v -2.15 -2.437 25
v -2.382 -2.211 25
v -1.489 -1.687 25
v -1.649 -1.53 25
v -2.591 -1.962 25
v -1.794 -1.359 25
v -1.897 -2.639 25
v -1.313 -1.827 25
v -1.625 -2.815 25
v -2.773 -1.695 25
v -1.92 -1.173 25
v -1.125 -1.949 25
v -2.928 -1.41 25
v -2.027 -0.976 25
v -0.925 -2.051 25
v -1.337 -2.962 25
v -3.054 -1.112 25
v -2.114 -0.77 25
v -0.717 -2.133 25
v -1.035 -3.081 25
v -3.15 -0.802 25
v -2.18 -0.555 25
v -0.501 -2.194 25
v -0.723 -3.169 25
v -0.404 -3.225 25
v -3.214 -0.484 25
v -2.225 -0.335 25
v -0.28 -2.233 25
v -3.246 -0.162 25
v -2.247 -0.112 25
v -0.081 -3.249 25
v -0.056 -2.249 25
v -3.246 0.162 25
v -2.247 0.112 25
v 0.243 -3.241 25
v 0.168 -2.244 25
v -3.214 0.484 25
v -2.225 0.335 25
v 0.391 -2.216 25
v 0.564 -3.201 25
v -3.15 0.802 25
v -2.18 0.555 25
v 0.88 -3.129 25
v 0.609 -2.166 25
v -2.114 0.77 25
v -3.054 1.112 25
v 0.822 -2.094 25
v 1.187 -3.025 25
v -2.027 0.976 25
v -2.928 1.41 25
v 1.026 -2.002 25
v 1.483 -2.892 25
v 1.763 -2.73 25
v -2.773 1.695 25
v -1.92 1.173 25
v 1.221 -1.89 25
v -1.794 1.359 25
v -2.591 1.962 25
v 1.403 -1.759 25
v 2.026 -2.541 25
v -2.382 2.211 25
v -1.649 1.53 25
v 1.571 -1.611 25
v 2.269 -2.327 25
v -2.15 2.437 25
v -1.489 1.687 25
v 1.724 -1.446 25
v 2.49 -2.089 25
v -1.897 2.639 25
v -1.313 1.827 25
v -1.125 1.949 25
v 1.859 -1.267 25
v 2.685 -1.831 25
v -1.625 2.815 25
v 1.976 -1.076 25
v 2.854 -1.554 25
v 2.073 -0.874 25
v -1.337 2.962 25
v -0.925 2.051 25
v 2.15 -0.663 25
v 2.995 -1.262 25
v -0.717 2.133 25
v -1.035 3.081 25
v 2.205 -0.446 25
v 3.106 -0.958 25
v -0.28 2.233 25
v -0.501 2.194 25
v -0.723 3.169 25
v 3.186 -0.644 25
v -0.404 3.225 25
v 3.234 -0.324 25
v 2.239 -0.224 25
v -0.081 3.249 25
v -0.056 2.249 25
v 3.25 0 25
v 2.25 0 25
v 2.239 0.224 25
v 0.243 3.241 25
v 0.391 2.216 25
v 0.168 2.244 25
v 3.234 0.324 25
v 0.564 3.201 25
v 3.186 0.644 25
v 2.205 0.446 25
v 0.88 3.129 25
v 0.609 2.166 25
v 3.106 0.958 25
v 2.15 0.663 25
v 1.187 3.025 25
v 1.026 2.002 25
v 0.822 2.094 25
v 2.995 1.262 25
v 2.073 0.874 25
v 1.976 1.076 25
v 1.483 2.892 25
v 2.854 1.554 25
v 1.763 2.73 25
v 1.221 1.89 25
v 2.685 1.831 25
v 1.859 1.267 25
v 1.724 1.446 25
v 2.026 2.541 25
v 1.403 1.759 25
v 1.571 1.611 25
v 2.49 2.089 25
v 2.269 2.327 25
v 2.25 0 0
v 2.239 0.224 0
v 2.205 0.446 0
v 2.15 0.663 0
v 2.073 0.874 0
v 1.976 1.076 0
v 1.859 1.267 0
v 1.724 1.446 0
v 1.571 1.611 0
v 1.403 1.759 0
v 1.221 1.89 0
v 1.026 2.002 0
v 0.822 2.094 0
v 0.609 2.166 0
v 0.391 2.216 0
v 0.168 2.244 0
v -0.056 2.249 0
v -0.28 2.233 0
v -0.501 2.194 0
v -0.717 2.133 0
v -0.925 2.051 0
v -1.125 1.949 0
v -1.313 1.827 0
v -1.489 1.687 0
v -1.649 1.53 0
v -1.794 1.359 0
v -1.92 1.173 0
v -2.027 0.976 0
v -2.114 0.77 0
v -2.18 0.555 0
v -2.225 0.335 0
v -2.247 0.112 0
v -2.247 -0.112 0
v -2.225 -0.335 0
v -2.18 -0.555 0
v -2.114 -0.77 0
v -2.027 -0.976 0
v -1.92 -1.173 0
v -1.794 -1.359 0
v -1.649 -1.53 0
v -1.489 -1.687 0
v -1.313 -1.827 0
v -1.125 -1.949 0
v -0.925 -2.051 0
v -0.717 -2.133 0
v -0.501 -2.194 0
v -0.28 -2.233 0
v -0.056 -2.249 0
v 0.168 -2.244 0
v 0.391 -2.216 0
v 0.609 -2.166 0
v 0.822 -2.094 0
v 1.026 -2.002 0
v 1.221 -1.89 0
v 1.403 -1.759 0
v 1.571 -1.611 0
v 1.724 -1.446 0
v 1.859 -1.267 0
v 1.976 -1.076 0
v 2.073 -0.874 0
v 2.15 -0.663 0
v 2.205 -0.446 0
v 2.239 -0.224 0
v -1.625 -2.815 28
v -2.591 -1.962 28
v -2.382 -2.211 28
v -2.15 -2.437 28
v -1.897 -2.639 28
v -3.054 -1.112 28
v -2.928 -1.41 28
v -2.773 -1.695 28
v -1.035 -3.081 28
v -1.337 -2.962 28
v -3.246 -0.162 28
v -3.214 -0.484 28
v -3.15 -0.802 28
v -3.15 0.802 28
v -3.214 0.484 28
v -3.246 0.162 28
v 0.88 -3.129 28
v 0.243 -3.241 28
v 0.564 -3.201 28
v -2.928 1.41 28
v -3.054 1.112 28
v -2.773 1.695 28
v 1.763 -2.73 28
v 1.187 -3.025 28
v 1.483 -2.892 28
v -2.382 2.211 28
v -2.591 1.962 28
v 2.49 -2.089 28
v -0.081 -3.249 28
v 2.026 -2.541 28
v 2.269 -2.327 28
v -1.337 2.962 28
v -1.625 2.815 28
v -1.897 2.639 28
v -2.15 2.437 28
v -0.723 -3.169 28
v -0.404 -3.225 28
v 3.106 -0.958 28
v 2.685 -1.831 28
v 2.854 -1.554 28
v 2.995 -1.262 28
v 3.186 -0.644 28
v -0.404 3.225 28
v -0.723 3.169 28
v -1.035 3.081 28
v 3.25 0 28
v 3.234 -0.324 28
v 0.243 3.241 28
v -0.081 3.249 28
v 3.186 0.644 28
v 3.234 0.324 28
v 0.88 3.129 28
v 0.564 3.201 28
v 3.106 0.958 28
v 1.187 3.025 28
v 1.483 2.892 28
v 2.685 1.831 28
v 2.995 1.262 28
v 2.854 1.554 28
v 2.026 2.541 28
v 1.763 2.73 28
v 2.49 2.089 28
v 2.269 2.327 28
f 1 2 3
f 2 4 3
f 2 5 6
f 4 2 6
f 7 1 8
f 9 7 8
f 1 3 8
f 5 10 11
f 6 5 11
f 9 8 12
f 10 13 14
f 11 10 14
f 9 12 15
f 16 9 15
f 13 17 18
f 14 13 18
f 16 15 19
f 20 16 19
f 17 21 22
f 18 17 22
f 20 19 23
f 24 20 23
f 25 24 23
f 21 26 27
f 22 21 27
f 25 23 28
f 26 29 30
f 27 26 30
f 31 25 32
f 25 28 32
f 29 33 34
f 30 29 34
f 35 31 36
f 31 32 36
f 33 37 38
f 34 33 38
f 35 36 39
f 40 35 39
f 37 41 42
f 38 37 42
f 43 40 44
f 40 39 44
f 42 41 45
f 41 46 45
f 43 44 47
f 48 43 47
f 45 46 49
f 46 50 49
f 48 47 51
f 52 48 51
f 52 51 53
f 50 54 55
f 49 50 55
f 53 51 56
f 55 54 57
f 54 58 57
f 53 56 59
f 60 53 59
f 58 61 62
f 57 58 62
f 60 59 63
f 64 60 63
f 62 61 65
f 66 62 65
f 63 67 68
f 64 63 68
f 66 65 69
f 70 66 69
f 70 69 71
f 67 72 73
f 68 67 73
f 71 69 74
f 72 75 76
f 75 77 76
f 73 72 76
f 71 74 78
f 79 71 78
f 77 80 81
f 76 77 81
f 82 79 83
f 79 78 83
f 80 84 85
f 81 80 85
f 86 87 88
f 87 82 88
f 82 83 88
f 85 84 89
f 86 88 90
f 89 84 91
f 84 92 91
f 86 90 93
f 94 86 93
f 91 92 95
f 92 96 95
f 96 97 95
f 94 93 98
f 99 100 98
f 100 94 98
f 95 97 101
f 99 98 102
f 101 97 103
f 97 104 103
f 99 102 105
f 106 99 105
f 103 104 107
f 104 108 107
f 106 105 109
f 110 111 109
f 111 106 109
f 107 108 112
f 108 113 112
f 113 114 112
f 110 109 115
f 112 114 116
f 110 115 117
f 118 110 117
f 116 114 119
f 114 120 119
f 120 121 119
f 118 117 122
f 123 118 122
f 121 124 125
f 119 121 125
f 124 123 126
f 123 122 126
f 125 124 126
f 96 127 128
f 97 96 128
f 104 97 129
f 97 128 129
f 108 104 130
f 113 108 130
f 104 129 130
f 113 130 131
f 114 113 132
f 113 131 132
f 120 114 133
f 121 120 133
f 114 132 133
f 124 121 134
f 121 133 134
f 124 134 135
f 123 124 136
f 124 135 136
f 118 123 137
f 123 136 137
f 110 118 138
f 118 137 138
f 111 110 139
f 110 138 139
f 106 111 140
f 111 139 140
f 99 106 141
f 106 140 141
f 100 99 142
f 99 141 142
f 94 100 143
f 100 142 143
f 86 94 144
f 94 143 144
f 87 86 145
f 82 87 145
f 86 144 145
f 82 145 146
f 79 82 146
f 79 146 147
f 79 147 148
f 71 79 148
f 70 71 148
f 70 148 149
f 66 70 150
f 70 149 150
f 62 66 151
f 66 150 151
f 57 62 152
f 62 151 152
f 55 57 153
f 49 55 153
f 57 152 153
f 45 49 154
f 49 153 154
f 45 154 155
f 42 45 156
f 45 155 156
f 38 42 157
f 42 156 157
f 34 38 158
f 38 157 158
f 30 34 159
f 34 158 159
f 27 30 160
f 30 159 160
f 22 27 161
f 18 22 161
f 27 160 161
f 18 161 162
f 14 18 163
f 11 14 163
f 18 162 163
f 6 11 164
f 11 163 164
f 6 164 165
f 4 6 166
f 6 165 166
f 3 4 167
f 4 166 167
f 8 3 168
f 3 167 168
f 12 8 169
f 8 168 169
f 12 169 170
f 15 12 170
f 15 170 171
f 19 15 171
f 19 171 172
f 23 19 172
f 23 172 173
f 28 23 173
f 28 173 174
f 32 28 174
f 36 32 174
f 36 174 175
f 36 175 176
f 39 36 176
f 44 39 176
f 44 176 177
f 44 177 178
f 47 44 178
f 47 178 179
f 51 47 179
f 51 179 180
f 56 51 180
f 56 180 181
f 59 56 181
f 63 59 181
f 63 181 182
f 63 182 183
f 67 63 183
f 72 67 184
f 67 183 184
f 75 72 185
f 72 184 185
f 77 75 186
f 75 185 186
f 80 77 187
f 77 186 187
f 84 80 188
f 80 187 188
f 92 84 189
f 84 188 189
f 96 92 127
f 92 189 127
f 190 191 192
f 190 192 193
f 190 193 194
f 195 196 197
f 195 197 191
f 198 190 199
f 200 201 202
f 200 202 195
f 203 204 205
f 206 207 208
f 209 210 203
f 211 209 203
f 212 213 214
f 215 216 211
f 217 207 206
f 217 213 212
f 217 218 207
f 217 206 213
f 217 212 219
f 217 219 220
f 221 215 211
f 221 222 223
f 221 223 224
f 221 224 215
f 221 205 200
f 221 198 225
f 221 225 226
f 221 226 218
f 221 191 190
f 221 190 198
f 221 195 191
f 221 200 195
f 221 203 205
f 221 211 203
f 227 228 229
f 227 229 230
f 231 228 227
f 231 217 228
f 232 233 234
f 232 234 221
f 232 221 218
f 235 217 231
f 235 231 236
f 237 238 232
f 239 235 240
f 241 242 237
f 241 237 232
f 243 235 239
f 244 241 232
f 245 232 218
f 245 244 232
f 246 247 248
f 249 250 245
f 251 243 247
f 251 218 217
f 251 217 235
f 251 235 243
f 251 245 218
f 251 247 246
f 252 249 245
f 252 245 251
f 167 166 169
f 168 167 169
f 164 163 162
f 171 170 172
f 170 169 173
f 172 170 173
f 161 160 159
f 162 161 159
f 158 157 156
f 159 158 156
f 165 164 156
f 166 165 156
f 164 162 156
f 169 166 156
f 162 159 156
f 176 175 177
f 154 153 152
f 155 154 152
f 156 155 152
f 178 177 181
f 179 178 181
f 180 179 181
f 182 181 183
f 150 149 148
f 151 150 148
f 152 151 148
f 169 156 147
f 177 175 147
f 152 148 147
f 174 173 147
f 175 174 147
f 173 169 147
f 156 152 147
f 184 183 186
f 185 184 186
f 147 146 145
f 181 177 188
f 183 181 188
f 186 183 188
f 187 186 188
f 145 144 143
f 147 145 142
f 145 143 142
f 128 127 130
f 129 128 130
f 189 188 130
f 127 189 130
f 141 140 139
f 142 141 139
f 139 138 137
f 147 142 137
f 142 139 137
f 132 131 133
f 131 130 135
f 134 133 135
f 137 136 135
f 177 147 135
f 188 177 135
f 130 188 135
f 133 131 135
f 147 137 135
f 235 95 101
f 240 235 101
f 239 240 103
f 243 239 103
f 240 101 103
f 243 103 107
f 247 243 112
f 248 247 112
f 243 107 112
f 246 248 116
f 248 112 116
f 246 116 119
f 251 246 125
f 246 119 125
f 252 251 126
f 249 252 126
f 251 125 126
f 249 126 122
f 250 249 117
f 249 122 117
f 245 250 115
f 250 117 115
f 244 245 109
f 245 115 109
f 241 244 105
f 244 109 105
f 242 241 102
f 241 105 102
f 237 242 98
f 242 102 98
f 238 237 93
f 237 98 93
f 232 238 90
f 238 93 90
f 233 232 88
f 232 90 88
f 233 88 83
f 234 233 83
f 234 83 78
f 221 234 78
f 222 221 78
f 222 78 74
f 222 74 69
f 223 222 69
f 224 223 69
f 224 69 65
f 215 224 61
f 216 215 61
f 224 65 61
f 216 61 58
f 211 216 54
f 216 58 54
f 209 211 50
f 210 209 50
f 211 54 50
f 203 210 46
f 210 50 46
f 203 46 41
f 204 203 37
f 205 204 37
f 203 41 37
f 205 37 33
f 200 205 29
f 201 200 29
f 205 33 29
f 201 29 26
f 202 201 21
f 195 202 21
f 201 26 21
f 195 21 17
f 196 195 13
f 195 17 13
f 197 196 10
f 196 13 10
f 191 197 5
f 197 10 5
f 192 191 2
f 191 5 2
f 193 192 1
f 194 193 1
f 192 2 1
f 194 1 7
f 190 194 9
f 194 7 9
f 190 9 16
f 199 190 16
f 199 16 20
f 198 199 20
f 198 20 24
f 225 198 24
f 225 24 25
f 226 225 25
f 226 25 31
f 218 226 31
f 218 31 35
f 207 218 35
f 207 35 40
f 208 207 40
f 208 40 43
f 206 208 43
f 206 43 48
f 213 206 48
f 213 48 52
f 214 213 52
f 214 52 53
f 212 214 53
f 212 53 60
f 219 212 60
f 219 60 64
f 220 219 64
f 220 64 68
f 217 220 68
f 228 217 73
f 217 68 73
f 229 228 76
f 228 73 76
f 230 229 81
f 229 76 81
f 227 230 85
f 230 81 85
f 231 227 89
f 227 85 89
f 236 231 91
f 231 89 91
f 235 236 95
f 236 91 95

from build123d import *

# Parameters (mm, degrees)
ESQUISSE1_R                    = 2.25
ESQUISSE1_R_2                  = 1.25
EXTRU_MINCE1_DEPTH             = 25
BOSS_EXTRU_1_REACH             = 14.899
ESQUISSE2_R                    = 1.25
BOSS_EXTRU_1_DIRECTION_2_REACH = 14.899
ESQUISSE3_R                    = 3.25
BOSS_EXTRU_2_DEPTH             = 3


with BuildPart() as part:
    # Esquisse1 → Extru.-Mince1 (new body)
    with BuildSketch(Plane.XY):
        Circle(ESQUISSE1_R)
        Circle(ESQUISSE1_R_2, mode=Mode.SUBTRACT)
    extrude(amount=EXTRU_MINCE1_DEPTH)

    # Boss.-Extru.1: up to this face of the body (flat: up to its plane)
    boss_extru_1_end = Plane(part.part.faces().sort_by_distance((-2.18636039, 0, 0))[0])
    # Esquisse2 → Boss.-Extru.1 (add, up to the picked face)
    with BuildSketch(Plane(origin=(0, 0, 12.5), x_dir=(-1, 0, 0), z_dir=(0, 0, -1)), mode=Mode.PRIVATE) as boss_extru_1_sk1:
        Circle(ESQUISSE2_R)
    boss_extru_1_tool1 = split(extrude(boss_extru_1_sk1.sketch, amount=BOSS_EXTRU_1_REACH, mode=Mode.PRIVATE), bisect_by=boss_extru_1_end, keep=Keep.BOTH, mode=Mode.PRIVATE)
    add(boss_extru_1_tool1.solids().sort_by(Axis((0, 0, 12.5), (0, 0, -1)))[0])

    # Boss.-Extru.1 direction 2: up to this face of the body (flat: up to its plane)
    boss_extru_1_direction_2_end = Plane(part.part.faces().sort_by_distance((-2.18636039, 0, 25))[0])
    # Esquisse2 → Boss.-Extru.1 direction 2 (add, up to the picked face)
    with BuildSketch(Plane(origin=(0, 0, 12.5), x_dir=(-1, 0, 0), z_dir=(0, 0, -1)), mode=Mode.PRIVATE) as boss_extru_1_direction_2_sk1:
        Circle(ESQUISSE2_R)
    boss_extru_1_direction_2_tool1 = split(extrude(boss_extru_1_direction_2_sk1.sketch, amount=-BOSS_EXTRU_1_DIRECTION_2_REACH, mode=Mode.PRIVATE), bisect_by=boss_extru_1_direction_2_end, keep=Keep.BOTH, mode=Mode.PRIVATE)
    add(boss_extru_1_direction_2_tool1.solids().sort_by(Axis((0, 0, 12.5), (0, 0, 1)))[0])

    # Esquisse3 → Boss.-Extru.2 (add)
    with BuildSketch(Plane.XY.offset(25)):
        Circle(ESQUISSE3_R)
    extrude(amount=BOSS_EXTRU_2_DEPTH)


solid = part.part
